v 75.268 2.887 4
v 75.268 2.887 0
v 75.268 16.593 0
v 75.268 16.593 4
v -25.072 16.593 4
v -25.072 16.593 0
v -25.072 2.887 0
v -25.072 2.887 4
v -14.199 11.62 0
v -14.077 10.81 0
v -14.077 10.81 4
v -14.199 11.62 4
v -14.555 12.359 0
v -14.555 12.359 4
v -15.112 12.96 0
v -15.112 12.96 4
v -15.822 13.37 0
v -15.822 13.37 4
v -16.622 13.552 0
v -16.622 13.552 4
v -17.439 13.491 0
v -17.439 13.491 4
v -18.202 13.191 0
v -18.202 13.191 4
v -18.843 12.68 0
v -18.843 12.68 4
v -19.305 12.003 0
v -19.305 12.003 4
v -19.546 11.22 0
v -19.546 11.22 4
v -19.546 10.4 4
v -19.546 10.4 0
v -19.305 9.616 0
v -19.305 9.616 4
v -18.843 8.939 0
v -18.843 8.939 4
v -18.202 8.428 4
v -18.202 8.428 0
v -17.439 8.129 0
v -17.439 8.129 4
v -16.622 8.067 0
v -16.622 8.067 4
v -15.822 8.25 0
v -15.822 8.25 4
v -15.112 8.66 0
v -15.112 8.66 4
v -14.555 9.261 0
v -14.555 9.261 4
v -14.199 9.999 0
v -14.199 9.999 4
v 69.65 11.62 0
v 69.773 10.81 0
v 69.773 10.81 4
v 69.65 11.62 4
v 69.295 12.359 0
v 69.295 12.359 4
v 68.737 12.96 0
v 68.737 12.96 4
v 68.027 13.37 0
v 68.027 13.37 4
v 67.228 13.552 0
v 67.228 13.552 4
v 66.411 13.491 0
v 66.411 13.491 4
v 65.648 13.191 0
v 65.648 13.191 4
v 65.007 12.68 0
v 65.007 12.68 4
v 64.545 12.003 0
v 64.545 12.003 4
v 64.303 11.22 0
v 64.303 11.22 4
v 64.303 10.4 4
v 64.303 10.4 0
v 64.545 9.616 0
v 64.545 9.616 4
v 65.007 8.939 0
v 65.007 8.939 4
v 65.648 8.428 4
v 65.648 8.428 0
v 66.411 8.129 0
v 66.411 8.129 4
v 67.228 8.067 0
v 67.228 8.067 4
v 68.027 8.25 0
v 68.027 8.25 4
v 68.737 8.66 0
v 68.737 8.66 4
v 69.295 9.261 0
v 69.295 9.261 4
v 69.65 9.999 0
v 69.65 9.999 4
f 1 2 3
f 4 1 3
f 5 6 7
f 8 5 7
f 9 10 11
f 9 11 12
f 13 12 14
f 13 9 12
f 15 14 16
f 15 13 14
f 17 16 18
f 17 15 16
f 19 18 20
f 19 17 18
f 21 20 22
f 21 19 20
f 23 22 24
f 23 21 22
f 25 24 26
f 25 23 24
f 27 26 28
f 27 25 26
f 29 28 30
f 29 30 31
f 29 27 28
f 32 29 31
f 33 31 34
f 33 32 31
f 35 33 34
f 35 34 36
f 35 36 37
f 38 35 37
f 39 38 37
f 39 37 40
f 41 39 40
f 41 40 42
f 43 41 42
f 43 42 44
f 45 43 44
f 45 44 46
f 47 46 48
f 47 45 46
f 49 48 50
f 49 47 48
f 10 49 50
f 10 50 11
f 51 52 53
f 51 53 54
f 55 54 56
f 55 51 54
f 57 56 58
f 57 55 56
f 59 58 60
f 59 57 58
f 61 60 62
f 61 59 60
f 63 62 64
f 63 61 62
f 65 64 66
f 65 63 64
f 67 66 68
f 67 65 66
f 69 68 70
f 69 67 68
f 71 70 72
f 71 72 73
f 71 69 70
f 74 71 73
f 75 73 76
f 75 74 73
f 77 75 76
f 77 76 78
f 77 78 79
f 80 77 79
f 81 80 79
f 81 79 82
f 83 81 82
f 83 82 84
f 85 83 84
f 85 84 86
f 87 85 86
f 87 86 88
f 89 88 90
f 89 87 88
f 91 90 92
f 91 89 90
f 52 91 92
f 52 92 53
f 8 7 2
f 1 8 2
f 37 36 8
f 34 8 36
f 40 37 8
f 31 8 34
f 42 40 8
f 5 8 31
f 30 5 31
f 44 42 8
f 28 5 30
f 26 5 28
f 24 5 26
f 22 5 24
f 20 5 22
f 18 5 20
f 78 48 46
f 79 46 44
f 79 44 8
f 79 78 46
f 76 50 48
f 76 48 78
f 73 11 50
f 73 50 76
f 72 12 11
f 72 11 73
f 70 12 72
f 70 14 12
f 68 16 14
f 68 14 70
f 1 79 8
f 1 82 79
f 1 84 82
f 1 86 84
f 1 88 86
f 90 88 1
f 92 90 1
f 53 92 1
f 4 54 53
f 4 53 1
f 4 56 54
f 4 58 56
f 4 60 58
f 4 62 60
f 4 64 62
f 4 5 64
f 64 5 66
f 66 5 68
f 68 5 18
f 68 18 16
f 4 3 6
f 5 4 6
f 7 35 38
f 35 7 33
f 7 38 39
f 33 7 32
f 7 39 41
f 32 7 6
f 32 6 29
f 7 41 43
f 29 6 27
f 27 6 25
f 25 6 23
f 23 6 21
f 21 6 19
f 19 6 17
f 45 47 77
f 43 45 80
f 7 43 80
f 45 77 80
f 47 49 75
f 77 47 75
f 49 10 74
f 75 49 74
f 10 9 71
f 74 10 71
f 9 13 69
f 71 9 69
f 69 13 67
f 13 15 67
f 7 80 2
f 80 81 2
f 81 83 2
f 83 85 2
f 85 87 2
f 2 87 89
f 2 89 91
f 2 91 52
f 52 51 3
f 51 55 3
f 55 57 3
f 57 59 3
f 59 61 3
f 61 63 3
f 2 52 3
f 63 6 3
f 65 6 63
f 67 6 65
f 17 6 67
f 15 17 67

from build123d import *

# Parameters (mm, degrees)
SKETCH1_R           = 2.75
BOSS_EXTRUDE1_DEPTH = 4
CUT_EXTRUDE1_DEPTH  = 10
BOSS_EXTRUDE3_START = -4
SKETCH3_R           = 2.75
BOSS_EXTRUDE3_DEPTH = 4
BOSS_EXTRUDE4_START = -4
SKETCH4_R           = 2.75
BOSS_EXTRUDE4_DEPTH = 4


with BuildPart() as part:
    # Sketch1 → Boss-Extrude1 (new body)
    with BuildSketch(Plane.XY):
        with BuildLine():
            Line((24.072178339, 16.5927117), (-24.072178339, 16.5927117))
            ThreePointArc((-24.072178339, 16.5927117), (-24.779285121, 16.299818481), (-25.072178339, 15.5927117))
            Line((-25.072178339, 15.5927117), (-25.072178339, 8.49545414))
            ThreePointArc((-25.072178339, 8.49545414), (-24.955491664, 8.026671065), (-24.632663198, 7.667289468))
            Line((-24.632663198, 7.667289468), (-1.120969717, -8.244942286))
            ThreePointArc((-1.120969717, -8.244942286), (0, -8.588612943), (1.120969717, -8.244942286))
            Line((1.120969717, -8.244942286), (24.632663198, 7.667289468))
            ThreePointArc((24.632663198, 7.667289468), (24.955491664, 8.026671065), (25.072178339, 8.49545414))
            Line((25.072178339, 8.49545414), (25.072178339, 15.5927117))
            ThreePointArc((25.072178339, 15.5927117), (24.779285121, 16.299818481), (24.072178339, 16.5927117))
        make_face()
        Circle(SKETCH1_R, mode=Mode.SUBTRACT)
        with Locations((-16.827094957, 10.809665828)):
            Circle(SKETCH1_R, mode=Mode.SUBTRACT)
        with Locations((16.827094957, 10.809665828)):
            Circle(SKETCH1_R, mode=Mode.SUBTRACT)
    extrude(amount=BOSS_EXTRUDE1_DEPTH)

    # Sketch2 → Cut-Extrude1 (cut)
    with BuildSketch(Plane.XY.offset(4)):
        Polygon((-24.632663198, 7.667289468), (24.632663198, 7.667289468), (0.25604332, -10.053182783), align=None)
    extrude(amount=-CUT_EXTRUDE1_DEPTH, mode=Mode.SUBTRACT)

    # Sketch3 → Boss-Extrude3 (add)
    # profile 1 of 2: a face of its own
    with BuildSketch(Plane.XY.offset(4).offset(BOSS_EXTRUDE3_START)):
        with BuildLine():
            Line((-24.072178339, 16.5927117), (-25.072178339, 16.5927117))
            Line((-25.072178339, 16.5927117), (-25.072178339, 15.5927117))
            ThreePointArc((-25.072178339, 15.5927117), (-24.779285121, 16.299818481), (-24.072178339, 16.5927117))
        make_face()
    # profile 2 of 2: a face of its own
    with BuildSketch(Plane.XY.offset(4).offset(BOSS_EXTRUDE3_START)):
        with BuildLine():
            ThreePointArc((-24.632663198, 7.667289468), (-24.955491664, 8.026671065), (-25.072178339, 8.49545414))
            Line((-25.072178339, 8.49545414), (-25.072178339, 2.887491698))
            Line((-25.072178339, 2.887491698), (75.267657001, 2.887491698))
            Line((75.267657001, 2.887491698), (75.267657001, 16.5927117))
            Line((75.267657001, 16.5927117), (24.072178339, 16.5927117))
            ThreePointArc((24.072178339, 16.5927117), (24.779285121, 16.299818481), (25.072178339, 15.5927117))
            Line((25.072178339, 15.5927117), (25.072178339, 8.49545414))
            ThreePointArc((25.072178339, 8.49545414), (24.955491664, 8.026671065), (24.632663198, 7.667289468))
            Line((24.632663198, 7.667289468), (-24.632663198, 7.667289468))
        make_face()
        with Locations((67.022573618, 10.809665828)):
            Circle(SKETCH3_R, mode=Mode.SUBTRACT)
    extrude(amount=BOSS_EXTRUDE3_DEPTH)

    # Sketch4 → Boss-Extrude4 (add)
    with BuildSketch(Plane.XY.offset(4).offset(BOSS_EXTRUDE4_START)):
        with Locations((16.827094957, 10.809665828)):
            Circle(SKETCH4_R)
    extrude(amount=BOSS_EXTRUDE4_DEPTH)


solid = part.part
